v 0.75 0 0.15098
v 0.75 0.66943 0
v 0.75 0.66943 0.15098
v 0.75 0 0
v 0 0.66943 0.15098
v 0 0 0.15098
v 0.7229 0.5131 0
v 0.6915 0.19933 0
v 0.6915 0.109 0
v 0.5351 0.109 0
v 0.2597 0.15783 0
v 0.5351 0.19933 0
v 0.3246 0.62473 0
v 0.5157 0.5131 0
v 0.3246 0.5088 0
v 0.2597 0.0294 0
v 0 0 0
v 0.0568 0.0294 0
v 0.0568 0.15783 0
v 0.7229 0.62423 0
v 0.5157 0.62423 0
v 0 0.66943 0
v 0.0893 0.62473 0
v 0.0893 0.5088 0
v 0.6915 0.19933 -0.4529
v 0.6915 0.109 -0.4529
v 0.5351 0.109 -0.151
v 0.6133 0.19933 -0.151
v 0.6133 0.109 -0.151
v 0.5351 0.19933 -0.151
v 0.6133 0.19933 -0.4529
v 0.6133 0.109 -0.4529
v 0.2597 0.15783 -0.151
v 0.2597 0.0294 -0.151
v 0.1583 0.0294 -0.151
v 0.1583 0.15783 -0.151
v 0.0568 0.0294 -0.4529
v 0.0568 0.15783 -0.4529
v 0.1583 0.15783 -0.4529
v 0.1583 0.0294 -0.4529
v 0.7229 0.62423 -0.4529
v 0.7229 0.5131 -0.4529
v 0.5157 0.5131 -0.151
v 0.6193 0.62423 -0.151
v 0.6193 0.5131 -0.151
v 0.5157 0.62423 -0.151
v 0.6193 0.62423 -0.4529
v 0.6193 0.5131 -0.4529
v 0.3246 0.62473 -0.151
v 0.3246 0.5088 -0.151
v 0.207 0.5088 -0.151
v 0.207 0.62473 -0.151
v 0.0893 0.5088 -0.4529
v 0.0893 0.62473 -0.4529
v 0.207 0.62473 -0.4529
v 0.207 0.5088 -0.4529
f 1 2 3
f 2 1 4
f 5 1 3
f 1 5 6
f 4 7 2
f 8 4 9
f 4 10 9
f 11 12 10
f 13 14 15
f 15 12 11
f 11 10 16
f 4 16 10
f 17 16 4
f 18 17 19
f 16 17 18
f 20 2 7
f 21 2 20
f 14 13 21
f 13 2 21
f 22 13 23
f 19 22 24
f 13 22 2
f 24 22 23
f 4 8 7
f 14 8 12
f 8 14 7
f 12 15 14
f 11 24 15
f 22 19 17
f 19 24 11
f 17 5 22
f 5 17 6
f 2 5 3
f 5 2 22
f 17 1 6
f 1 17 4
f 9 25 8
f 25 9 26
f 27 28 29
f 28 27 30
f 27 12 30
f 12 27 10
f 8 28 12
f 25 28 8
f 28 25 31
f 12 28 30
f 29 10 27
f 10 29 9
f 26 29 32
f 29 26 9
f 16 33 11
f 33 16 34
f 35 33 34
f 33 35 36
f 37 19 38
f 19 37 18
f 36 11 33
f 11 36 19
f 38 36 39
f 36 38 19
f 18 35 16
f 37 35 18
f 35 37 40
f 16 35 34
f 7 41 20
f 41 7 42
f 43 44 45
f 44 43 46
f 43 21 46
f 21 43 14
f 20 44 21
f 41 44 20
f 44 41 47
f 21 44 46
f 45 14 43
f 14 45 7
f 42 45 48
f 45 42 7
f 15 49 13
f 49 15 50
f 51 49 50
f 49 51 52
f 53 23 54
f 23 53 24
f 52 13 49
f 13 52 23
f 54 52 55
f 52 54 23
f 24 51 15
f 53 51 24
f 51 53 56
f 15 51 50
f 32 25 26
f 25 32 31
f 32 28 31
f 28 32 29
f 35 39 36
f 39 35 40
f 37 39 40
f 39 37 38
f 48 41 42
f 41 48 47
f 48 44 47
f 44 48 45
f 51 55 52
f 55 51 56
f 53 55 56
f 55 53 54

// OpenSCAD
// Parametric variables
base_length = 0.75;
base_width = 0.669426;
base_height = 0.150979;
shallow_pad_depth = 0.151;
deep_start_below = 0.1509;
deep_end_below = 0.4529;

// Derived z coordinates (base bottom at z=0)
z_base_bot = 0;
z_base_top = base_height;
z_shallow_bot = -shallow_pad_depth;
z_shallow_top = 0;
z_deep_bot = -deep_end_below;
z_deep_top = -deep_start_below;

$fn = 50;

// Module: rectangular block positioned by offsets from base edges and z range
module rect_block(b_l, b_w, o_left, o_right, o_front, o_back, z_bot, z_top) {
    translate([o_left, o_front, z_bot])
        cube([b_l - o_left - o_right, b_w - o_front - o_back, z_top - z_bot]);
}

union() {
    // Solid rectangular base
    rect_block(base_length, base_width, 0, 0, 0, 0, z_base_bot, z_base_top);

    // --- Shallow pads (extend below base underside) ---

    // Pad 1: 0.156427 x 0.090313
    rect_block(base_length, base_width,
        0.5351, 0.0585, 0.109, 0.4701,
        z_shallow_bot, z_shallow_top);

    // Pad 2: 0.202932 x 0.128382
    rect_block(base_length, base_width,
        0.0568, 0.4903, 0.0294, 0.5116,
        z_shallow_bot, z_shallow_top);

    // Pad 3: 0.207237 x 0.111076
    rect_block(base_length, base_width,
        0.5157, 0.0271, 0.5131, 0.0452,
        z_shallow_bot, z_shallow_top);

    // Pad 4: 0.235324 x 0.115862
    rect_block(base_length, base_width,
        0.0893, 0.4254, 0.5088, 0.0447,
        z_shallow_bot, z_shallow_top);

    // --- Deep continuations (narrower sections below shallow pads) ---

    // Deep 1: below pad 1, 0.078214 x 0.090313, shares right/front/back edges
    rect_block(base_length, base_width,
        0.6133, 0.0585, 0.109, 0.4701,
        z_deep_bot, z_deep_top);

    // Deep 2: below pad 2, 0.101466 x 0.128382, shares left/front/back edges
    rect_block(base_length, base_width,
        0.0568, 0.5917, 0.0294, 0.5116,
        z_deep_bot, z_deep_top);

    // Deep 3: below pad 3, 0.103619 x 0.111076, shares right/front/back edges
    rect_block(base_length, base_width,
        0.6193, 0.0271, 0.5131, 0.0452,
        z_deep_bot, z_deep_top);

    // Deep 4: below pad 4, 0.117662 x 0.115862, shares left/front/back edges
    rect_block(base_length, base_width,
        0.0893, 0.543, 0.5088, 0.0447,
        z_deep_bot, z_deep_top);
}
